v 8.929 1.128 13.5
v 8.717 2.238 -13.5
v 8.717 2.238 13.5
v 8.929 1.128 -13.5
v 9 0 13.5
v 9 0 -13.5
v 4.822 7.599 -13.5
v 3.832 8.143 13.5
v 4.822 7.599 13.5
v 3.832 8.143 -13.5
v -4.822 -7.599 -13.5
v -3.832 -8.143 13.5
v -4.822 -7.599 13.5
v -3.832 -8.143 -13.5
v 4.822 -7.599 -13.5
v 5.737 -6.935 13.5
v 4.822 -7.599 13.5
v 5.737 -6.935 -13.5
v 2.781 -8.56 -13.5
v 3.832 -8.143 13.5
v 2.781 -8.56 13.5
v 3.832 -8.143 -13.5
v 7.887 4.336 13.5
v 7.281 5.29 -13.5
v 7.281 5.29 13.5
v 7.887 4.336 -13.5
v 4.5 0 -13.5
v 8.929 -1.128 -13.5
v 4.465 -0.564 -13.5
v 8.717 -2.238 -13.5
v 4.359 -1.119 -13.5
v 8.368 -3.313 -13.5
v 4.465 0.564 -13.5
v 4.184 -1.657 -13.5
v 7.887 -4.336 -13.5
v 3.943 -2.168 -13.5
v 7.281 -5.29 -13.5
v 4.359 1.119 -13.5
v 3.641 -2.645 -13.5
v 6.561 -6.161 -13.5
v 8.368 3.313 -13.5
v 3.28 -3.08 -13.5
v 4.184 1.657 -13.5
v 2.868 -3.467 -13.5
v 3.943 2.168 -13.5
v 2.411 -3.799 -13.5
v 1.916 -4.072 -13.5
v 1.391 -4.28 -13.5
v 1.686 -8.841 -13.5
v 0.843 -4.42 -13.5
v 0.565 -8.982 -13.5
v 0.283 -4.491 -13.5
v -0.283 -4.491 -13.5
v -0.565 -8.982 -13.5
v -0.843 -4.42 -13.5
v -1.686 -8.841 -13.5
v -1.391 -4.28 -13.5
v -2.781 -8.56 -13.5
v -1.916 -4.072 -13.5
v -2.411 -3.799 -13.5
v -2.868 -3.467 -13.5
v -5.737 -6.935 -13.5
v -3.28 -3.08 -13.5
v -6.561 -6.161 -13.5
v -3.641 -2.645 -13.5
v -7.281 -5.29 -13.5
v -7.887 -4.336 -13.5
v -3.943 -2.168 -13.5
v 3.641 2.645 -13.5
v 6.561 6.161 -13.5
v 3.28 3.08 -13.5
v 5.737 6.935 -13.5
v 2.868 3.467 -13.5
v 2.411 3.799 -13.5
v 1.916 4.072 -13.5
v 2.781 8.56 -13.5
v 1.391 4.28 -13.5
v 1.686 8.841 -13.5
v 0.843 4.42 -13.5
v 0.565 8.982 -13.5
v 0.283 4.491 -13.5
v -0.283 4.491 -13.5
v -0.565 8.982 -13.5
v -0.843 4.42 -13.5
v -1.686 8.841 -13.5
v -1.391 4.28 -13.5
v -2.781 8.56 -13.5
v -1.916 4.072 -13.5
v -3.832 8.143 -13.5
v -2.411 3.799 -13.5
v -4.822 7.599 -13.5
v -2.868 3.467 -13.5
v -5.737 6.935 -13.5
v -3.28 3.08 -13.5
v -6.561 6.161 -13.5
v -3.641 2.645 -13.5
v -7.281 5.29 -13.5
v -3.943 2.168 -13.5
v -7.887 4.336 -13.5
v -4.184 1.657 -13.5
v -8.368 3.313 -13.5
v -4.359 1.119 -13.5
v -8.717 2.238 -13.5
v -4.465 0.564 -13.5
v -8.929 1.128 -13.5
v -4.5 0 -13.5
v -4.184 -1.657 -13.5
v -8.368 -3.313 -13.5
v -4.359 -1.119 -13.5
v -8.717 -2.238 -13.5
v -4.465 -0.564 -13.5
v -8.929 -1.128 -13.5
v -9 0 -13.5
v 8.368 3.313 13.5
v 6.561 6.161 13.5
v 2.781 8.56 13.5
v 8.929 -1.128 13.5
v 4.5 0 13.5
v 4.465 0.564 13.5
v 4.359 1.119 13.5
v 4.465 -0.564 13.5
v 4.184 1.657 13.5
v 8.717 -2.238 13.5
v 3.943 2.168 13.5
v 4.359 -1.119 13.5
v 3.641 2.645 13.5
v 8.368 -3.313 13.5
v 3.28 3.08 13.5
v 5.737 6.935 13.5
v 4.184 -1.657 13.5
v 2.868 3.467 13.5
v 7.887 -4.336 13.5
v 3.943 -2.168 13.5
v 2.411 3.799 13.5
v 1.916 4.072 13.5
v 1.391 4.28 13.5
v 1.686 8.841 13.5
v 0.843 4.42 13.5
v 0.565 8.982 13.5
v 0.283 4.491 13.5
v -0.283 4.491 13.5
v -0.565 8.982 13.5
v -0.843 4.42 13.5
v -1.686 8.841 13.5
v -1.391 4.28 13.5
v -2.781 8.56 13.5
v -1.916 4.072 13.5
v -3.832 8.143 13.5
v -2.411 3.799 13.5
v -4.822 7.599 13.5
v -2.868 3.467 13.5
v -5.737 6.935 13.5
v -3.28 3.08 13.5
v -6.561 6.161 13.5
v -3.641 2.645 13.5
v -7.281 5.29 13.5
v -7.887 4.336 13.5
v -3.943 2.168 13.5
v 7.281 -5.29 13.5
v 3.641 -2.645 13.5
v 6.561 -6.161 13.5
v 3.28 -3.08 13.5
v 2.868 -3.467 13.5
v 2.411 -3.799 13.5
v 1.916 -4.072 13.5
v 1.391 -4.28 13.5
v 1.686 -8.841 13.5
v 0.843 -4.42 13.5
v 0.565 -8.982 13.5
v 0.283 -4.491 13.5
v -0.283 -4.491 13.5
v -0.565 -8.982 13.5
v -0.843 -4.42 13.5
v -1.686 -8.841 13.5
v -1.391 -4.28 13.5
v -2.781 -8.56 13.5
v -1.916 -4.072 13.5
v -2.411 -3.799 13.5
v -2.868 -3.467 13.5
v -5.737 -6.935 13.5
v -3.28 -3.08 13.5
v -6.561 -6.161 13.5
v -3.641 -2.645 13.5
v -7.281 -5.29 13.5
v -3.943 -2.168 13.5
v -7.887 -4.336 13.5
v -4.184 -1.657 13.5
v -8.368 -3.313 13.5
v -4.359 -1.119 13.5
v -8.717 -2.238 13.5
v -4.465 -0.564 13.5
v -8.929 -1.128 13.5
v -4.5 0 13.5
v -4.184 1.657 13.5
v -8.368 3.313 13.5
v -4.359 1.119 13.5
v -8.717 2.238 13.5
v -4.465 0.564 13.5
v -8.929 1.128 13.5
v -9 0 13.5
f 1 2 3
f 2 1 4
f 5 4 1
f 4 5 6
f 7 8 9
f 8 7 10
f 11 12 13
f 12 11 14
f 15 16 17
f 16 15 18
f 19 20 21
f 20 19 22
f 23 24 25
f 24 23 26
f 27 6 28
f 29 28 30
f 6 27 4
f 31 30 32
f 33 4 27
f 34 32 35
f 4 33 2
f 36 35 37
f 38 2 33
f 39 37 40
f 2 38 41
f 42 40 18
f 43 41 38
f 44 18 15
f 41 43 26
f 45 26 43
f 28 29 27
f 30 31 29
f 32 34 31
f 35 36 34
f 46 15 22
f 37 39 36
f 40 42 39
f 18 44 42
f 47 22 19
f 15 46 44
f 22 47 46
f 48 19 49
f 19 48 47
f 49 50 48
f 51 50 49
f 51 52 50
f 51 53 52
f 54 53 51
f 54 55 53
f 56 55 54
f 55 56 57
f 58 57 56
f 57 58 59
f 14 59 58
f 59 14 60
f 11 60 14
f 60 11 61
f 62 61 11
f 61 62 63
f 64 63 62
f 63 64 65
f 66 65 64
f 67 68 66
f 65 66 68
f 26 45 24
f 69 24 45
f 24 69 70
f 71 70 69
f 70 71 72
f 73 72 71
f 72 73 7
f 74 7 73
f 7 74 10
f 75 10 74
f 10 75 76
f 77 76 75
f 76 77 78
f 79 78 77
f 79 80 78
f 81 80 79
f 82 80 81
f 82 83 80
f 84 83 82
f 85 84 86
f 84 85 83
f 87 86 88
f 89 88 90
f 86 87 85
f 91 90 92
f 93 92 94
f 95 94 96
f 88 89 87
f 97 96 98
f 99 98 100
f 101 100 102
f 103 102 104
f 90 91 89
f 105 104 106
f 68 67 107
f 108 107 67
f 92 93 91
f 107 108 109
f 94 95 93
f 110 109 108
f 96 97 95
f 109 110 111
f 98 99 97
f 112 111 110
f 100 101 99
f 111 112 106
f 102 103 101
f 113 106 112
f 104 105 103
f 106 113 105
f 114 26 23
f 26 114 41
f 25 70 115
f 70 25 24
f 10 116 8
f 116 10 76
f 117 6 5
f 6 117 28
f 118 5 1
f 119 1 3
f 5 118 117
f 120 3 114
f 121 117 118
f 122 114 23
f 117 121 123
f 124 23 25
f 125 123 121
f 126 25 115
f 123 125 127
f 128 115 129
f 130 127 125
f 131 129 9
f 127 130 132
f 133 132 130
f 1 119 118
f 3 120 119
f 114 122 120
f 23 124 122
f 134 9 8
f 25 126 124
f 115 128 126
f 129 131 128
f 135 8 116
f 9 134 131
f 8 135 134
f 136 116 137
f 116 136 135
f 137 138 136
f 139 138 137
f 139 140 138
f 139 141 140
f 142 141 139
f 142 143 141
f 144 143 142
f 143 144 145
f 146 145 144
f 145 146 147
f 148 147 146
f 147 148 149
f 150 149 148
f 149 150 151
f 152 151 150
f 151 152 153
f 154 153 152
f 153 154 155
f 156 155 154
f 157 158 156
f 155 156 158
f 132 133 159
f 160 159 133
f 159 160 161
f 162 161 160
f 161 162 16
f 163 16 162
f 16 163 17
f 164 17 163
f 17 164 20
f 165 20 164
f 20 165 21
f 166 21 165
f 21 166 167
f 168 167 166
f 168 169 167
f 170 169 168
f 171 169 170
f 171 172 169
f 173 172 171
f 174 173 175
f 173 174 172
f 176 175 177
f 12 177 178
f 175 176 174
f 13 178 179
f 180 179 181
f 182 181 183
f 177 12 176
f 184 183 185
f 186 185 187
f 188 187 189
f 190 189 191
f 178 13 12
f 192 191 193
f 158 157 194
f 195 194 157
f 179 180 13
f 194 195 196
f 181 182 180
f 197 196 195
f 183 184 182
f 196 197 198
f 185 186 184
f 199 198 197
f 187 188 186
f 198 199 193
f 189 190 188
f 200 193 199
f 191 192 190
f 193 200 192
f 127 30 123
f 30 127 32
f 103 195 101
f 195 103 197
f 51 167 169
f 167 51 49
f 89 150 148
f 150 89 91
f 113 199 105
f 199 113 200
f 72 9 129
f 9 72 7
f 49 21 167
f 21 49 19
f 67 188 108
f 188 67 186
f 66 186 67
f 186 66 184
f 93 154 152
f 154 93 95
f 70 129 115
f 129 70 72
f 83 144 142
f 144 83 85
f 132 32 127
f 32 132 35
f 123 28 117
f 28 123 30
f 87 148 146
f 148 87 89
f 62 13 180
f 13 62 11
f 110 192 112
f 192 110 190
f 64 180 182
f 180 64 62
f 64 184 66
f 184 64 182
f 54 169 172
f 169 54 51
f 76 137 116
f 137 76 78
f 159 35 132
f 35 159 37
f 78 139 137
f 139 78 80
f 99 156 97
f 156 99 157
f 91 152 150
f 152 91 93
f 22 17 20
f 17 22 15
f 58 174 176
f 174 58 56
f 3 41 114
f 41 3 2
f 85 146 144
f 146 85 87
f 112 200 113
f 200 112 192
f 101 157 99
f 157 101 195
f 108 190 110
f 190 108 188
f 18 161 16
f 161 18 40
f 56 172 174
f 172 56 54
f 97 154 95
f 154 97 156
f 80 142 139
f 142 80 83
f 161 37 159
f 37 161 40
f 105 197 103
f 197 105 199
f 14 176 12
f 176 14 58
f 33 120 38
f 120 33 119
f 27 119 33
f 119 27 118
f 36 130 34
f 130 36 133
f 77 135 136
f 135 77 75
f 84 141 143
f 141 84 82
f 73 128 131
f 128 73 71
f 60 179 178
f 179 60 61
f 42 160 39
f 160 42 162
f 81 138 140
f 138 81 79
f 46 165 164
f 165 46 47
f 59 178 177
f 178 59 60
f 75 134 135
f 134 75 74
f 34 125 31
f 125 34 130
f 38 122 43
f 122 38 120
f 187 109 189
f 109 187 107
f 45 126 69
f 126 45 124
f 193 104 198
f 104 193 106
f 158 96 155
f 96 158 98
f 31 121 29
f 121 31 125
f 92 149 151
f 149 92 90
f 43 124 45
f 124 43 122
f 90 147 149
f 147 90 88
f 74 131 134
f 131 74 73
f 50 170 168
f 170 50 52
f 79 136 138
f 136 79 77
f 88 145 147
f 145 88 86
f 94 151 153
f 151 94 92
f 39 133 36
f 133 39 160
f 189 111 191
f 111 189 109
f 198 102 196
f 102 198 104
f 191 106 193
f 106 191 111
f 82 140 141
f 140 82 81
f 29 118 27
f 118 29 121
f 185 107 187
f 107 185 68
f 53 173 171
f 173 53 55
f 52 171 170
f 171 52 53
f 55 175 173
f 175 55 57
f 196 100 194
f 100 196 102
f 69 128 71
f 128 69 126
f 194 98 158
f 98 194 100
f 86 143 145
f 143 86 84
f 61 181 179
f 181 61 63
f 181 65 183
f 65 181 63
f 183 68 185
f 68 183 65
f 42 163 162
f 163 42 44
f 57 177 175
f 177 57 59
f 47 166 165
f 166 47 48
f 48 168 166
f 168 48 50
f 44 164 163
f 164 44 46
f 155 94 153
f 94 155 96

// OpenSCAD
$fn = 50;


difference() {
	union() {
		translate(v = [0, 0, -13.5000000000]) {
			cylinder(h = 27, r = 9.0000000000);
		}
	}
	union() {
		translate(v = [0, 0, -100.0000000000]) {
			cylinder(h = 200, r = 4.5000000000);
		}
	}
}
